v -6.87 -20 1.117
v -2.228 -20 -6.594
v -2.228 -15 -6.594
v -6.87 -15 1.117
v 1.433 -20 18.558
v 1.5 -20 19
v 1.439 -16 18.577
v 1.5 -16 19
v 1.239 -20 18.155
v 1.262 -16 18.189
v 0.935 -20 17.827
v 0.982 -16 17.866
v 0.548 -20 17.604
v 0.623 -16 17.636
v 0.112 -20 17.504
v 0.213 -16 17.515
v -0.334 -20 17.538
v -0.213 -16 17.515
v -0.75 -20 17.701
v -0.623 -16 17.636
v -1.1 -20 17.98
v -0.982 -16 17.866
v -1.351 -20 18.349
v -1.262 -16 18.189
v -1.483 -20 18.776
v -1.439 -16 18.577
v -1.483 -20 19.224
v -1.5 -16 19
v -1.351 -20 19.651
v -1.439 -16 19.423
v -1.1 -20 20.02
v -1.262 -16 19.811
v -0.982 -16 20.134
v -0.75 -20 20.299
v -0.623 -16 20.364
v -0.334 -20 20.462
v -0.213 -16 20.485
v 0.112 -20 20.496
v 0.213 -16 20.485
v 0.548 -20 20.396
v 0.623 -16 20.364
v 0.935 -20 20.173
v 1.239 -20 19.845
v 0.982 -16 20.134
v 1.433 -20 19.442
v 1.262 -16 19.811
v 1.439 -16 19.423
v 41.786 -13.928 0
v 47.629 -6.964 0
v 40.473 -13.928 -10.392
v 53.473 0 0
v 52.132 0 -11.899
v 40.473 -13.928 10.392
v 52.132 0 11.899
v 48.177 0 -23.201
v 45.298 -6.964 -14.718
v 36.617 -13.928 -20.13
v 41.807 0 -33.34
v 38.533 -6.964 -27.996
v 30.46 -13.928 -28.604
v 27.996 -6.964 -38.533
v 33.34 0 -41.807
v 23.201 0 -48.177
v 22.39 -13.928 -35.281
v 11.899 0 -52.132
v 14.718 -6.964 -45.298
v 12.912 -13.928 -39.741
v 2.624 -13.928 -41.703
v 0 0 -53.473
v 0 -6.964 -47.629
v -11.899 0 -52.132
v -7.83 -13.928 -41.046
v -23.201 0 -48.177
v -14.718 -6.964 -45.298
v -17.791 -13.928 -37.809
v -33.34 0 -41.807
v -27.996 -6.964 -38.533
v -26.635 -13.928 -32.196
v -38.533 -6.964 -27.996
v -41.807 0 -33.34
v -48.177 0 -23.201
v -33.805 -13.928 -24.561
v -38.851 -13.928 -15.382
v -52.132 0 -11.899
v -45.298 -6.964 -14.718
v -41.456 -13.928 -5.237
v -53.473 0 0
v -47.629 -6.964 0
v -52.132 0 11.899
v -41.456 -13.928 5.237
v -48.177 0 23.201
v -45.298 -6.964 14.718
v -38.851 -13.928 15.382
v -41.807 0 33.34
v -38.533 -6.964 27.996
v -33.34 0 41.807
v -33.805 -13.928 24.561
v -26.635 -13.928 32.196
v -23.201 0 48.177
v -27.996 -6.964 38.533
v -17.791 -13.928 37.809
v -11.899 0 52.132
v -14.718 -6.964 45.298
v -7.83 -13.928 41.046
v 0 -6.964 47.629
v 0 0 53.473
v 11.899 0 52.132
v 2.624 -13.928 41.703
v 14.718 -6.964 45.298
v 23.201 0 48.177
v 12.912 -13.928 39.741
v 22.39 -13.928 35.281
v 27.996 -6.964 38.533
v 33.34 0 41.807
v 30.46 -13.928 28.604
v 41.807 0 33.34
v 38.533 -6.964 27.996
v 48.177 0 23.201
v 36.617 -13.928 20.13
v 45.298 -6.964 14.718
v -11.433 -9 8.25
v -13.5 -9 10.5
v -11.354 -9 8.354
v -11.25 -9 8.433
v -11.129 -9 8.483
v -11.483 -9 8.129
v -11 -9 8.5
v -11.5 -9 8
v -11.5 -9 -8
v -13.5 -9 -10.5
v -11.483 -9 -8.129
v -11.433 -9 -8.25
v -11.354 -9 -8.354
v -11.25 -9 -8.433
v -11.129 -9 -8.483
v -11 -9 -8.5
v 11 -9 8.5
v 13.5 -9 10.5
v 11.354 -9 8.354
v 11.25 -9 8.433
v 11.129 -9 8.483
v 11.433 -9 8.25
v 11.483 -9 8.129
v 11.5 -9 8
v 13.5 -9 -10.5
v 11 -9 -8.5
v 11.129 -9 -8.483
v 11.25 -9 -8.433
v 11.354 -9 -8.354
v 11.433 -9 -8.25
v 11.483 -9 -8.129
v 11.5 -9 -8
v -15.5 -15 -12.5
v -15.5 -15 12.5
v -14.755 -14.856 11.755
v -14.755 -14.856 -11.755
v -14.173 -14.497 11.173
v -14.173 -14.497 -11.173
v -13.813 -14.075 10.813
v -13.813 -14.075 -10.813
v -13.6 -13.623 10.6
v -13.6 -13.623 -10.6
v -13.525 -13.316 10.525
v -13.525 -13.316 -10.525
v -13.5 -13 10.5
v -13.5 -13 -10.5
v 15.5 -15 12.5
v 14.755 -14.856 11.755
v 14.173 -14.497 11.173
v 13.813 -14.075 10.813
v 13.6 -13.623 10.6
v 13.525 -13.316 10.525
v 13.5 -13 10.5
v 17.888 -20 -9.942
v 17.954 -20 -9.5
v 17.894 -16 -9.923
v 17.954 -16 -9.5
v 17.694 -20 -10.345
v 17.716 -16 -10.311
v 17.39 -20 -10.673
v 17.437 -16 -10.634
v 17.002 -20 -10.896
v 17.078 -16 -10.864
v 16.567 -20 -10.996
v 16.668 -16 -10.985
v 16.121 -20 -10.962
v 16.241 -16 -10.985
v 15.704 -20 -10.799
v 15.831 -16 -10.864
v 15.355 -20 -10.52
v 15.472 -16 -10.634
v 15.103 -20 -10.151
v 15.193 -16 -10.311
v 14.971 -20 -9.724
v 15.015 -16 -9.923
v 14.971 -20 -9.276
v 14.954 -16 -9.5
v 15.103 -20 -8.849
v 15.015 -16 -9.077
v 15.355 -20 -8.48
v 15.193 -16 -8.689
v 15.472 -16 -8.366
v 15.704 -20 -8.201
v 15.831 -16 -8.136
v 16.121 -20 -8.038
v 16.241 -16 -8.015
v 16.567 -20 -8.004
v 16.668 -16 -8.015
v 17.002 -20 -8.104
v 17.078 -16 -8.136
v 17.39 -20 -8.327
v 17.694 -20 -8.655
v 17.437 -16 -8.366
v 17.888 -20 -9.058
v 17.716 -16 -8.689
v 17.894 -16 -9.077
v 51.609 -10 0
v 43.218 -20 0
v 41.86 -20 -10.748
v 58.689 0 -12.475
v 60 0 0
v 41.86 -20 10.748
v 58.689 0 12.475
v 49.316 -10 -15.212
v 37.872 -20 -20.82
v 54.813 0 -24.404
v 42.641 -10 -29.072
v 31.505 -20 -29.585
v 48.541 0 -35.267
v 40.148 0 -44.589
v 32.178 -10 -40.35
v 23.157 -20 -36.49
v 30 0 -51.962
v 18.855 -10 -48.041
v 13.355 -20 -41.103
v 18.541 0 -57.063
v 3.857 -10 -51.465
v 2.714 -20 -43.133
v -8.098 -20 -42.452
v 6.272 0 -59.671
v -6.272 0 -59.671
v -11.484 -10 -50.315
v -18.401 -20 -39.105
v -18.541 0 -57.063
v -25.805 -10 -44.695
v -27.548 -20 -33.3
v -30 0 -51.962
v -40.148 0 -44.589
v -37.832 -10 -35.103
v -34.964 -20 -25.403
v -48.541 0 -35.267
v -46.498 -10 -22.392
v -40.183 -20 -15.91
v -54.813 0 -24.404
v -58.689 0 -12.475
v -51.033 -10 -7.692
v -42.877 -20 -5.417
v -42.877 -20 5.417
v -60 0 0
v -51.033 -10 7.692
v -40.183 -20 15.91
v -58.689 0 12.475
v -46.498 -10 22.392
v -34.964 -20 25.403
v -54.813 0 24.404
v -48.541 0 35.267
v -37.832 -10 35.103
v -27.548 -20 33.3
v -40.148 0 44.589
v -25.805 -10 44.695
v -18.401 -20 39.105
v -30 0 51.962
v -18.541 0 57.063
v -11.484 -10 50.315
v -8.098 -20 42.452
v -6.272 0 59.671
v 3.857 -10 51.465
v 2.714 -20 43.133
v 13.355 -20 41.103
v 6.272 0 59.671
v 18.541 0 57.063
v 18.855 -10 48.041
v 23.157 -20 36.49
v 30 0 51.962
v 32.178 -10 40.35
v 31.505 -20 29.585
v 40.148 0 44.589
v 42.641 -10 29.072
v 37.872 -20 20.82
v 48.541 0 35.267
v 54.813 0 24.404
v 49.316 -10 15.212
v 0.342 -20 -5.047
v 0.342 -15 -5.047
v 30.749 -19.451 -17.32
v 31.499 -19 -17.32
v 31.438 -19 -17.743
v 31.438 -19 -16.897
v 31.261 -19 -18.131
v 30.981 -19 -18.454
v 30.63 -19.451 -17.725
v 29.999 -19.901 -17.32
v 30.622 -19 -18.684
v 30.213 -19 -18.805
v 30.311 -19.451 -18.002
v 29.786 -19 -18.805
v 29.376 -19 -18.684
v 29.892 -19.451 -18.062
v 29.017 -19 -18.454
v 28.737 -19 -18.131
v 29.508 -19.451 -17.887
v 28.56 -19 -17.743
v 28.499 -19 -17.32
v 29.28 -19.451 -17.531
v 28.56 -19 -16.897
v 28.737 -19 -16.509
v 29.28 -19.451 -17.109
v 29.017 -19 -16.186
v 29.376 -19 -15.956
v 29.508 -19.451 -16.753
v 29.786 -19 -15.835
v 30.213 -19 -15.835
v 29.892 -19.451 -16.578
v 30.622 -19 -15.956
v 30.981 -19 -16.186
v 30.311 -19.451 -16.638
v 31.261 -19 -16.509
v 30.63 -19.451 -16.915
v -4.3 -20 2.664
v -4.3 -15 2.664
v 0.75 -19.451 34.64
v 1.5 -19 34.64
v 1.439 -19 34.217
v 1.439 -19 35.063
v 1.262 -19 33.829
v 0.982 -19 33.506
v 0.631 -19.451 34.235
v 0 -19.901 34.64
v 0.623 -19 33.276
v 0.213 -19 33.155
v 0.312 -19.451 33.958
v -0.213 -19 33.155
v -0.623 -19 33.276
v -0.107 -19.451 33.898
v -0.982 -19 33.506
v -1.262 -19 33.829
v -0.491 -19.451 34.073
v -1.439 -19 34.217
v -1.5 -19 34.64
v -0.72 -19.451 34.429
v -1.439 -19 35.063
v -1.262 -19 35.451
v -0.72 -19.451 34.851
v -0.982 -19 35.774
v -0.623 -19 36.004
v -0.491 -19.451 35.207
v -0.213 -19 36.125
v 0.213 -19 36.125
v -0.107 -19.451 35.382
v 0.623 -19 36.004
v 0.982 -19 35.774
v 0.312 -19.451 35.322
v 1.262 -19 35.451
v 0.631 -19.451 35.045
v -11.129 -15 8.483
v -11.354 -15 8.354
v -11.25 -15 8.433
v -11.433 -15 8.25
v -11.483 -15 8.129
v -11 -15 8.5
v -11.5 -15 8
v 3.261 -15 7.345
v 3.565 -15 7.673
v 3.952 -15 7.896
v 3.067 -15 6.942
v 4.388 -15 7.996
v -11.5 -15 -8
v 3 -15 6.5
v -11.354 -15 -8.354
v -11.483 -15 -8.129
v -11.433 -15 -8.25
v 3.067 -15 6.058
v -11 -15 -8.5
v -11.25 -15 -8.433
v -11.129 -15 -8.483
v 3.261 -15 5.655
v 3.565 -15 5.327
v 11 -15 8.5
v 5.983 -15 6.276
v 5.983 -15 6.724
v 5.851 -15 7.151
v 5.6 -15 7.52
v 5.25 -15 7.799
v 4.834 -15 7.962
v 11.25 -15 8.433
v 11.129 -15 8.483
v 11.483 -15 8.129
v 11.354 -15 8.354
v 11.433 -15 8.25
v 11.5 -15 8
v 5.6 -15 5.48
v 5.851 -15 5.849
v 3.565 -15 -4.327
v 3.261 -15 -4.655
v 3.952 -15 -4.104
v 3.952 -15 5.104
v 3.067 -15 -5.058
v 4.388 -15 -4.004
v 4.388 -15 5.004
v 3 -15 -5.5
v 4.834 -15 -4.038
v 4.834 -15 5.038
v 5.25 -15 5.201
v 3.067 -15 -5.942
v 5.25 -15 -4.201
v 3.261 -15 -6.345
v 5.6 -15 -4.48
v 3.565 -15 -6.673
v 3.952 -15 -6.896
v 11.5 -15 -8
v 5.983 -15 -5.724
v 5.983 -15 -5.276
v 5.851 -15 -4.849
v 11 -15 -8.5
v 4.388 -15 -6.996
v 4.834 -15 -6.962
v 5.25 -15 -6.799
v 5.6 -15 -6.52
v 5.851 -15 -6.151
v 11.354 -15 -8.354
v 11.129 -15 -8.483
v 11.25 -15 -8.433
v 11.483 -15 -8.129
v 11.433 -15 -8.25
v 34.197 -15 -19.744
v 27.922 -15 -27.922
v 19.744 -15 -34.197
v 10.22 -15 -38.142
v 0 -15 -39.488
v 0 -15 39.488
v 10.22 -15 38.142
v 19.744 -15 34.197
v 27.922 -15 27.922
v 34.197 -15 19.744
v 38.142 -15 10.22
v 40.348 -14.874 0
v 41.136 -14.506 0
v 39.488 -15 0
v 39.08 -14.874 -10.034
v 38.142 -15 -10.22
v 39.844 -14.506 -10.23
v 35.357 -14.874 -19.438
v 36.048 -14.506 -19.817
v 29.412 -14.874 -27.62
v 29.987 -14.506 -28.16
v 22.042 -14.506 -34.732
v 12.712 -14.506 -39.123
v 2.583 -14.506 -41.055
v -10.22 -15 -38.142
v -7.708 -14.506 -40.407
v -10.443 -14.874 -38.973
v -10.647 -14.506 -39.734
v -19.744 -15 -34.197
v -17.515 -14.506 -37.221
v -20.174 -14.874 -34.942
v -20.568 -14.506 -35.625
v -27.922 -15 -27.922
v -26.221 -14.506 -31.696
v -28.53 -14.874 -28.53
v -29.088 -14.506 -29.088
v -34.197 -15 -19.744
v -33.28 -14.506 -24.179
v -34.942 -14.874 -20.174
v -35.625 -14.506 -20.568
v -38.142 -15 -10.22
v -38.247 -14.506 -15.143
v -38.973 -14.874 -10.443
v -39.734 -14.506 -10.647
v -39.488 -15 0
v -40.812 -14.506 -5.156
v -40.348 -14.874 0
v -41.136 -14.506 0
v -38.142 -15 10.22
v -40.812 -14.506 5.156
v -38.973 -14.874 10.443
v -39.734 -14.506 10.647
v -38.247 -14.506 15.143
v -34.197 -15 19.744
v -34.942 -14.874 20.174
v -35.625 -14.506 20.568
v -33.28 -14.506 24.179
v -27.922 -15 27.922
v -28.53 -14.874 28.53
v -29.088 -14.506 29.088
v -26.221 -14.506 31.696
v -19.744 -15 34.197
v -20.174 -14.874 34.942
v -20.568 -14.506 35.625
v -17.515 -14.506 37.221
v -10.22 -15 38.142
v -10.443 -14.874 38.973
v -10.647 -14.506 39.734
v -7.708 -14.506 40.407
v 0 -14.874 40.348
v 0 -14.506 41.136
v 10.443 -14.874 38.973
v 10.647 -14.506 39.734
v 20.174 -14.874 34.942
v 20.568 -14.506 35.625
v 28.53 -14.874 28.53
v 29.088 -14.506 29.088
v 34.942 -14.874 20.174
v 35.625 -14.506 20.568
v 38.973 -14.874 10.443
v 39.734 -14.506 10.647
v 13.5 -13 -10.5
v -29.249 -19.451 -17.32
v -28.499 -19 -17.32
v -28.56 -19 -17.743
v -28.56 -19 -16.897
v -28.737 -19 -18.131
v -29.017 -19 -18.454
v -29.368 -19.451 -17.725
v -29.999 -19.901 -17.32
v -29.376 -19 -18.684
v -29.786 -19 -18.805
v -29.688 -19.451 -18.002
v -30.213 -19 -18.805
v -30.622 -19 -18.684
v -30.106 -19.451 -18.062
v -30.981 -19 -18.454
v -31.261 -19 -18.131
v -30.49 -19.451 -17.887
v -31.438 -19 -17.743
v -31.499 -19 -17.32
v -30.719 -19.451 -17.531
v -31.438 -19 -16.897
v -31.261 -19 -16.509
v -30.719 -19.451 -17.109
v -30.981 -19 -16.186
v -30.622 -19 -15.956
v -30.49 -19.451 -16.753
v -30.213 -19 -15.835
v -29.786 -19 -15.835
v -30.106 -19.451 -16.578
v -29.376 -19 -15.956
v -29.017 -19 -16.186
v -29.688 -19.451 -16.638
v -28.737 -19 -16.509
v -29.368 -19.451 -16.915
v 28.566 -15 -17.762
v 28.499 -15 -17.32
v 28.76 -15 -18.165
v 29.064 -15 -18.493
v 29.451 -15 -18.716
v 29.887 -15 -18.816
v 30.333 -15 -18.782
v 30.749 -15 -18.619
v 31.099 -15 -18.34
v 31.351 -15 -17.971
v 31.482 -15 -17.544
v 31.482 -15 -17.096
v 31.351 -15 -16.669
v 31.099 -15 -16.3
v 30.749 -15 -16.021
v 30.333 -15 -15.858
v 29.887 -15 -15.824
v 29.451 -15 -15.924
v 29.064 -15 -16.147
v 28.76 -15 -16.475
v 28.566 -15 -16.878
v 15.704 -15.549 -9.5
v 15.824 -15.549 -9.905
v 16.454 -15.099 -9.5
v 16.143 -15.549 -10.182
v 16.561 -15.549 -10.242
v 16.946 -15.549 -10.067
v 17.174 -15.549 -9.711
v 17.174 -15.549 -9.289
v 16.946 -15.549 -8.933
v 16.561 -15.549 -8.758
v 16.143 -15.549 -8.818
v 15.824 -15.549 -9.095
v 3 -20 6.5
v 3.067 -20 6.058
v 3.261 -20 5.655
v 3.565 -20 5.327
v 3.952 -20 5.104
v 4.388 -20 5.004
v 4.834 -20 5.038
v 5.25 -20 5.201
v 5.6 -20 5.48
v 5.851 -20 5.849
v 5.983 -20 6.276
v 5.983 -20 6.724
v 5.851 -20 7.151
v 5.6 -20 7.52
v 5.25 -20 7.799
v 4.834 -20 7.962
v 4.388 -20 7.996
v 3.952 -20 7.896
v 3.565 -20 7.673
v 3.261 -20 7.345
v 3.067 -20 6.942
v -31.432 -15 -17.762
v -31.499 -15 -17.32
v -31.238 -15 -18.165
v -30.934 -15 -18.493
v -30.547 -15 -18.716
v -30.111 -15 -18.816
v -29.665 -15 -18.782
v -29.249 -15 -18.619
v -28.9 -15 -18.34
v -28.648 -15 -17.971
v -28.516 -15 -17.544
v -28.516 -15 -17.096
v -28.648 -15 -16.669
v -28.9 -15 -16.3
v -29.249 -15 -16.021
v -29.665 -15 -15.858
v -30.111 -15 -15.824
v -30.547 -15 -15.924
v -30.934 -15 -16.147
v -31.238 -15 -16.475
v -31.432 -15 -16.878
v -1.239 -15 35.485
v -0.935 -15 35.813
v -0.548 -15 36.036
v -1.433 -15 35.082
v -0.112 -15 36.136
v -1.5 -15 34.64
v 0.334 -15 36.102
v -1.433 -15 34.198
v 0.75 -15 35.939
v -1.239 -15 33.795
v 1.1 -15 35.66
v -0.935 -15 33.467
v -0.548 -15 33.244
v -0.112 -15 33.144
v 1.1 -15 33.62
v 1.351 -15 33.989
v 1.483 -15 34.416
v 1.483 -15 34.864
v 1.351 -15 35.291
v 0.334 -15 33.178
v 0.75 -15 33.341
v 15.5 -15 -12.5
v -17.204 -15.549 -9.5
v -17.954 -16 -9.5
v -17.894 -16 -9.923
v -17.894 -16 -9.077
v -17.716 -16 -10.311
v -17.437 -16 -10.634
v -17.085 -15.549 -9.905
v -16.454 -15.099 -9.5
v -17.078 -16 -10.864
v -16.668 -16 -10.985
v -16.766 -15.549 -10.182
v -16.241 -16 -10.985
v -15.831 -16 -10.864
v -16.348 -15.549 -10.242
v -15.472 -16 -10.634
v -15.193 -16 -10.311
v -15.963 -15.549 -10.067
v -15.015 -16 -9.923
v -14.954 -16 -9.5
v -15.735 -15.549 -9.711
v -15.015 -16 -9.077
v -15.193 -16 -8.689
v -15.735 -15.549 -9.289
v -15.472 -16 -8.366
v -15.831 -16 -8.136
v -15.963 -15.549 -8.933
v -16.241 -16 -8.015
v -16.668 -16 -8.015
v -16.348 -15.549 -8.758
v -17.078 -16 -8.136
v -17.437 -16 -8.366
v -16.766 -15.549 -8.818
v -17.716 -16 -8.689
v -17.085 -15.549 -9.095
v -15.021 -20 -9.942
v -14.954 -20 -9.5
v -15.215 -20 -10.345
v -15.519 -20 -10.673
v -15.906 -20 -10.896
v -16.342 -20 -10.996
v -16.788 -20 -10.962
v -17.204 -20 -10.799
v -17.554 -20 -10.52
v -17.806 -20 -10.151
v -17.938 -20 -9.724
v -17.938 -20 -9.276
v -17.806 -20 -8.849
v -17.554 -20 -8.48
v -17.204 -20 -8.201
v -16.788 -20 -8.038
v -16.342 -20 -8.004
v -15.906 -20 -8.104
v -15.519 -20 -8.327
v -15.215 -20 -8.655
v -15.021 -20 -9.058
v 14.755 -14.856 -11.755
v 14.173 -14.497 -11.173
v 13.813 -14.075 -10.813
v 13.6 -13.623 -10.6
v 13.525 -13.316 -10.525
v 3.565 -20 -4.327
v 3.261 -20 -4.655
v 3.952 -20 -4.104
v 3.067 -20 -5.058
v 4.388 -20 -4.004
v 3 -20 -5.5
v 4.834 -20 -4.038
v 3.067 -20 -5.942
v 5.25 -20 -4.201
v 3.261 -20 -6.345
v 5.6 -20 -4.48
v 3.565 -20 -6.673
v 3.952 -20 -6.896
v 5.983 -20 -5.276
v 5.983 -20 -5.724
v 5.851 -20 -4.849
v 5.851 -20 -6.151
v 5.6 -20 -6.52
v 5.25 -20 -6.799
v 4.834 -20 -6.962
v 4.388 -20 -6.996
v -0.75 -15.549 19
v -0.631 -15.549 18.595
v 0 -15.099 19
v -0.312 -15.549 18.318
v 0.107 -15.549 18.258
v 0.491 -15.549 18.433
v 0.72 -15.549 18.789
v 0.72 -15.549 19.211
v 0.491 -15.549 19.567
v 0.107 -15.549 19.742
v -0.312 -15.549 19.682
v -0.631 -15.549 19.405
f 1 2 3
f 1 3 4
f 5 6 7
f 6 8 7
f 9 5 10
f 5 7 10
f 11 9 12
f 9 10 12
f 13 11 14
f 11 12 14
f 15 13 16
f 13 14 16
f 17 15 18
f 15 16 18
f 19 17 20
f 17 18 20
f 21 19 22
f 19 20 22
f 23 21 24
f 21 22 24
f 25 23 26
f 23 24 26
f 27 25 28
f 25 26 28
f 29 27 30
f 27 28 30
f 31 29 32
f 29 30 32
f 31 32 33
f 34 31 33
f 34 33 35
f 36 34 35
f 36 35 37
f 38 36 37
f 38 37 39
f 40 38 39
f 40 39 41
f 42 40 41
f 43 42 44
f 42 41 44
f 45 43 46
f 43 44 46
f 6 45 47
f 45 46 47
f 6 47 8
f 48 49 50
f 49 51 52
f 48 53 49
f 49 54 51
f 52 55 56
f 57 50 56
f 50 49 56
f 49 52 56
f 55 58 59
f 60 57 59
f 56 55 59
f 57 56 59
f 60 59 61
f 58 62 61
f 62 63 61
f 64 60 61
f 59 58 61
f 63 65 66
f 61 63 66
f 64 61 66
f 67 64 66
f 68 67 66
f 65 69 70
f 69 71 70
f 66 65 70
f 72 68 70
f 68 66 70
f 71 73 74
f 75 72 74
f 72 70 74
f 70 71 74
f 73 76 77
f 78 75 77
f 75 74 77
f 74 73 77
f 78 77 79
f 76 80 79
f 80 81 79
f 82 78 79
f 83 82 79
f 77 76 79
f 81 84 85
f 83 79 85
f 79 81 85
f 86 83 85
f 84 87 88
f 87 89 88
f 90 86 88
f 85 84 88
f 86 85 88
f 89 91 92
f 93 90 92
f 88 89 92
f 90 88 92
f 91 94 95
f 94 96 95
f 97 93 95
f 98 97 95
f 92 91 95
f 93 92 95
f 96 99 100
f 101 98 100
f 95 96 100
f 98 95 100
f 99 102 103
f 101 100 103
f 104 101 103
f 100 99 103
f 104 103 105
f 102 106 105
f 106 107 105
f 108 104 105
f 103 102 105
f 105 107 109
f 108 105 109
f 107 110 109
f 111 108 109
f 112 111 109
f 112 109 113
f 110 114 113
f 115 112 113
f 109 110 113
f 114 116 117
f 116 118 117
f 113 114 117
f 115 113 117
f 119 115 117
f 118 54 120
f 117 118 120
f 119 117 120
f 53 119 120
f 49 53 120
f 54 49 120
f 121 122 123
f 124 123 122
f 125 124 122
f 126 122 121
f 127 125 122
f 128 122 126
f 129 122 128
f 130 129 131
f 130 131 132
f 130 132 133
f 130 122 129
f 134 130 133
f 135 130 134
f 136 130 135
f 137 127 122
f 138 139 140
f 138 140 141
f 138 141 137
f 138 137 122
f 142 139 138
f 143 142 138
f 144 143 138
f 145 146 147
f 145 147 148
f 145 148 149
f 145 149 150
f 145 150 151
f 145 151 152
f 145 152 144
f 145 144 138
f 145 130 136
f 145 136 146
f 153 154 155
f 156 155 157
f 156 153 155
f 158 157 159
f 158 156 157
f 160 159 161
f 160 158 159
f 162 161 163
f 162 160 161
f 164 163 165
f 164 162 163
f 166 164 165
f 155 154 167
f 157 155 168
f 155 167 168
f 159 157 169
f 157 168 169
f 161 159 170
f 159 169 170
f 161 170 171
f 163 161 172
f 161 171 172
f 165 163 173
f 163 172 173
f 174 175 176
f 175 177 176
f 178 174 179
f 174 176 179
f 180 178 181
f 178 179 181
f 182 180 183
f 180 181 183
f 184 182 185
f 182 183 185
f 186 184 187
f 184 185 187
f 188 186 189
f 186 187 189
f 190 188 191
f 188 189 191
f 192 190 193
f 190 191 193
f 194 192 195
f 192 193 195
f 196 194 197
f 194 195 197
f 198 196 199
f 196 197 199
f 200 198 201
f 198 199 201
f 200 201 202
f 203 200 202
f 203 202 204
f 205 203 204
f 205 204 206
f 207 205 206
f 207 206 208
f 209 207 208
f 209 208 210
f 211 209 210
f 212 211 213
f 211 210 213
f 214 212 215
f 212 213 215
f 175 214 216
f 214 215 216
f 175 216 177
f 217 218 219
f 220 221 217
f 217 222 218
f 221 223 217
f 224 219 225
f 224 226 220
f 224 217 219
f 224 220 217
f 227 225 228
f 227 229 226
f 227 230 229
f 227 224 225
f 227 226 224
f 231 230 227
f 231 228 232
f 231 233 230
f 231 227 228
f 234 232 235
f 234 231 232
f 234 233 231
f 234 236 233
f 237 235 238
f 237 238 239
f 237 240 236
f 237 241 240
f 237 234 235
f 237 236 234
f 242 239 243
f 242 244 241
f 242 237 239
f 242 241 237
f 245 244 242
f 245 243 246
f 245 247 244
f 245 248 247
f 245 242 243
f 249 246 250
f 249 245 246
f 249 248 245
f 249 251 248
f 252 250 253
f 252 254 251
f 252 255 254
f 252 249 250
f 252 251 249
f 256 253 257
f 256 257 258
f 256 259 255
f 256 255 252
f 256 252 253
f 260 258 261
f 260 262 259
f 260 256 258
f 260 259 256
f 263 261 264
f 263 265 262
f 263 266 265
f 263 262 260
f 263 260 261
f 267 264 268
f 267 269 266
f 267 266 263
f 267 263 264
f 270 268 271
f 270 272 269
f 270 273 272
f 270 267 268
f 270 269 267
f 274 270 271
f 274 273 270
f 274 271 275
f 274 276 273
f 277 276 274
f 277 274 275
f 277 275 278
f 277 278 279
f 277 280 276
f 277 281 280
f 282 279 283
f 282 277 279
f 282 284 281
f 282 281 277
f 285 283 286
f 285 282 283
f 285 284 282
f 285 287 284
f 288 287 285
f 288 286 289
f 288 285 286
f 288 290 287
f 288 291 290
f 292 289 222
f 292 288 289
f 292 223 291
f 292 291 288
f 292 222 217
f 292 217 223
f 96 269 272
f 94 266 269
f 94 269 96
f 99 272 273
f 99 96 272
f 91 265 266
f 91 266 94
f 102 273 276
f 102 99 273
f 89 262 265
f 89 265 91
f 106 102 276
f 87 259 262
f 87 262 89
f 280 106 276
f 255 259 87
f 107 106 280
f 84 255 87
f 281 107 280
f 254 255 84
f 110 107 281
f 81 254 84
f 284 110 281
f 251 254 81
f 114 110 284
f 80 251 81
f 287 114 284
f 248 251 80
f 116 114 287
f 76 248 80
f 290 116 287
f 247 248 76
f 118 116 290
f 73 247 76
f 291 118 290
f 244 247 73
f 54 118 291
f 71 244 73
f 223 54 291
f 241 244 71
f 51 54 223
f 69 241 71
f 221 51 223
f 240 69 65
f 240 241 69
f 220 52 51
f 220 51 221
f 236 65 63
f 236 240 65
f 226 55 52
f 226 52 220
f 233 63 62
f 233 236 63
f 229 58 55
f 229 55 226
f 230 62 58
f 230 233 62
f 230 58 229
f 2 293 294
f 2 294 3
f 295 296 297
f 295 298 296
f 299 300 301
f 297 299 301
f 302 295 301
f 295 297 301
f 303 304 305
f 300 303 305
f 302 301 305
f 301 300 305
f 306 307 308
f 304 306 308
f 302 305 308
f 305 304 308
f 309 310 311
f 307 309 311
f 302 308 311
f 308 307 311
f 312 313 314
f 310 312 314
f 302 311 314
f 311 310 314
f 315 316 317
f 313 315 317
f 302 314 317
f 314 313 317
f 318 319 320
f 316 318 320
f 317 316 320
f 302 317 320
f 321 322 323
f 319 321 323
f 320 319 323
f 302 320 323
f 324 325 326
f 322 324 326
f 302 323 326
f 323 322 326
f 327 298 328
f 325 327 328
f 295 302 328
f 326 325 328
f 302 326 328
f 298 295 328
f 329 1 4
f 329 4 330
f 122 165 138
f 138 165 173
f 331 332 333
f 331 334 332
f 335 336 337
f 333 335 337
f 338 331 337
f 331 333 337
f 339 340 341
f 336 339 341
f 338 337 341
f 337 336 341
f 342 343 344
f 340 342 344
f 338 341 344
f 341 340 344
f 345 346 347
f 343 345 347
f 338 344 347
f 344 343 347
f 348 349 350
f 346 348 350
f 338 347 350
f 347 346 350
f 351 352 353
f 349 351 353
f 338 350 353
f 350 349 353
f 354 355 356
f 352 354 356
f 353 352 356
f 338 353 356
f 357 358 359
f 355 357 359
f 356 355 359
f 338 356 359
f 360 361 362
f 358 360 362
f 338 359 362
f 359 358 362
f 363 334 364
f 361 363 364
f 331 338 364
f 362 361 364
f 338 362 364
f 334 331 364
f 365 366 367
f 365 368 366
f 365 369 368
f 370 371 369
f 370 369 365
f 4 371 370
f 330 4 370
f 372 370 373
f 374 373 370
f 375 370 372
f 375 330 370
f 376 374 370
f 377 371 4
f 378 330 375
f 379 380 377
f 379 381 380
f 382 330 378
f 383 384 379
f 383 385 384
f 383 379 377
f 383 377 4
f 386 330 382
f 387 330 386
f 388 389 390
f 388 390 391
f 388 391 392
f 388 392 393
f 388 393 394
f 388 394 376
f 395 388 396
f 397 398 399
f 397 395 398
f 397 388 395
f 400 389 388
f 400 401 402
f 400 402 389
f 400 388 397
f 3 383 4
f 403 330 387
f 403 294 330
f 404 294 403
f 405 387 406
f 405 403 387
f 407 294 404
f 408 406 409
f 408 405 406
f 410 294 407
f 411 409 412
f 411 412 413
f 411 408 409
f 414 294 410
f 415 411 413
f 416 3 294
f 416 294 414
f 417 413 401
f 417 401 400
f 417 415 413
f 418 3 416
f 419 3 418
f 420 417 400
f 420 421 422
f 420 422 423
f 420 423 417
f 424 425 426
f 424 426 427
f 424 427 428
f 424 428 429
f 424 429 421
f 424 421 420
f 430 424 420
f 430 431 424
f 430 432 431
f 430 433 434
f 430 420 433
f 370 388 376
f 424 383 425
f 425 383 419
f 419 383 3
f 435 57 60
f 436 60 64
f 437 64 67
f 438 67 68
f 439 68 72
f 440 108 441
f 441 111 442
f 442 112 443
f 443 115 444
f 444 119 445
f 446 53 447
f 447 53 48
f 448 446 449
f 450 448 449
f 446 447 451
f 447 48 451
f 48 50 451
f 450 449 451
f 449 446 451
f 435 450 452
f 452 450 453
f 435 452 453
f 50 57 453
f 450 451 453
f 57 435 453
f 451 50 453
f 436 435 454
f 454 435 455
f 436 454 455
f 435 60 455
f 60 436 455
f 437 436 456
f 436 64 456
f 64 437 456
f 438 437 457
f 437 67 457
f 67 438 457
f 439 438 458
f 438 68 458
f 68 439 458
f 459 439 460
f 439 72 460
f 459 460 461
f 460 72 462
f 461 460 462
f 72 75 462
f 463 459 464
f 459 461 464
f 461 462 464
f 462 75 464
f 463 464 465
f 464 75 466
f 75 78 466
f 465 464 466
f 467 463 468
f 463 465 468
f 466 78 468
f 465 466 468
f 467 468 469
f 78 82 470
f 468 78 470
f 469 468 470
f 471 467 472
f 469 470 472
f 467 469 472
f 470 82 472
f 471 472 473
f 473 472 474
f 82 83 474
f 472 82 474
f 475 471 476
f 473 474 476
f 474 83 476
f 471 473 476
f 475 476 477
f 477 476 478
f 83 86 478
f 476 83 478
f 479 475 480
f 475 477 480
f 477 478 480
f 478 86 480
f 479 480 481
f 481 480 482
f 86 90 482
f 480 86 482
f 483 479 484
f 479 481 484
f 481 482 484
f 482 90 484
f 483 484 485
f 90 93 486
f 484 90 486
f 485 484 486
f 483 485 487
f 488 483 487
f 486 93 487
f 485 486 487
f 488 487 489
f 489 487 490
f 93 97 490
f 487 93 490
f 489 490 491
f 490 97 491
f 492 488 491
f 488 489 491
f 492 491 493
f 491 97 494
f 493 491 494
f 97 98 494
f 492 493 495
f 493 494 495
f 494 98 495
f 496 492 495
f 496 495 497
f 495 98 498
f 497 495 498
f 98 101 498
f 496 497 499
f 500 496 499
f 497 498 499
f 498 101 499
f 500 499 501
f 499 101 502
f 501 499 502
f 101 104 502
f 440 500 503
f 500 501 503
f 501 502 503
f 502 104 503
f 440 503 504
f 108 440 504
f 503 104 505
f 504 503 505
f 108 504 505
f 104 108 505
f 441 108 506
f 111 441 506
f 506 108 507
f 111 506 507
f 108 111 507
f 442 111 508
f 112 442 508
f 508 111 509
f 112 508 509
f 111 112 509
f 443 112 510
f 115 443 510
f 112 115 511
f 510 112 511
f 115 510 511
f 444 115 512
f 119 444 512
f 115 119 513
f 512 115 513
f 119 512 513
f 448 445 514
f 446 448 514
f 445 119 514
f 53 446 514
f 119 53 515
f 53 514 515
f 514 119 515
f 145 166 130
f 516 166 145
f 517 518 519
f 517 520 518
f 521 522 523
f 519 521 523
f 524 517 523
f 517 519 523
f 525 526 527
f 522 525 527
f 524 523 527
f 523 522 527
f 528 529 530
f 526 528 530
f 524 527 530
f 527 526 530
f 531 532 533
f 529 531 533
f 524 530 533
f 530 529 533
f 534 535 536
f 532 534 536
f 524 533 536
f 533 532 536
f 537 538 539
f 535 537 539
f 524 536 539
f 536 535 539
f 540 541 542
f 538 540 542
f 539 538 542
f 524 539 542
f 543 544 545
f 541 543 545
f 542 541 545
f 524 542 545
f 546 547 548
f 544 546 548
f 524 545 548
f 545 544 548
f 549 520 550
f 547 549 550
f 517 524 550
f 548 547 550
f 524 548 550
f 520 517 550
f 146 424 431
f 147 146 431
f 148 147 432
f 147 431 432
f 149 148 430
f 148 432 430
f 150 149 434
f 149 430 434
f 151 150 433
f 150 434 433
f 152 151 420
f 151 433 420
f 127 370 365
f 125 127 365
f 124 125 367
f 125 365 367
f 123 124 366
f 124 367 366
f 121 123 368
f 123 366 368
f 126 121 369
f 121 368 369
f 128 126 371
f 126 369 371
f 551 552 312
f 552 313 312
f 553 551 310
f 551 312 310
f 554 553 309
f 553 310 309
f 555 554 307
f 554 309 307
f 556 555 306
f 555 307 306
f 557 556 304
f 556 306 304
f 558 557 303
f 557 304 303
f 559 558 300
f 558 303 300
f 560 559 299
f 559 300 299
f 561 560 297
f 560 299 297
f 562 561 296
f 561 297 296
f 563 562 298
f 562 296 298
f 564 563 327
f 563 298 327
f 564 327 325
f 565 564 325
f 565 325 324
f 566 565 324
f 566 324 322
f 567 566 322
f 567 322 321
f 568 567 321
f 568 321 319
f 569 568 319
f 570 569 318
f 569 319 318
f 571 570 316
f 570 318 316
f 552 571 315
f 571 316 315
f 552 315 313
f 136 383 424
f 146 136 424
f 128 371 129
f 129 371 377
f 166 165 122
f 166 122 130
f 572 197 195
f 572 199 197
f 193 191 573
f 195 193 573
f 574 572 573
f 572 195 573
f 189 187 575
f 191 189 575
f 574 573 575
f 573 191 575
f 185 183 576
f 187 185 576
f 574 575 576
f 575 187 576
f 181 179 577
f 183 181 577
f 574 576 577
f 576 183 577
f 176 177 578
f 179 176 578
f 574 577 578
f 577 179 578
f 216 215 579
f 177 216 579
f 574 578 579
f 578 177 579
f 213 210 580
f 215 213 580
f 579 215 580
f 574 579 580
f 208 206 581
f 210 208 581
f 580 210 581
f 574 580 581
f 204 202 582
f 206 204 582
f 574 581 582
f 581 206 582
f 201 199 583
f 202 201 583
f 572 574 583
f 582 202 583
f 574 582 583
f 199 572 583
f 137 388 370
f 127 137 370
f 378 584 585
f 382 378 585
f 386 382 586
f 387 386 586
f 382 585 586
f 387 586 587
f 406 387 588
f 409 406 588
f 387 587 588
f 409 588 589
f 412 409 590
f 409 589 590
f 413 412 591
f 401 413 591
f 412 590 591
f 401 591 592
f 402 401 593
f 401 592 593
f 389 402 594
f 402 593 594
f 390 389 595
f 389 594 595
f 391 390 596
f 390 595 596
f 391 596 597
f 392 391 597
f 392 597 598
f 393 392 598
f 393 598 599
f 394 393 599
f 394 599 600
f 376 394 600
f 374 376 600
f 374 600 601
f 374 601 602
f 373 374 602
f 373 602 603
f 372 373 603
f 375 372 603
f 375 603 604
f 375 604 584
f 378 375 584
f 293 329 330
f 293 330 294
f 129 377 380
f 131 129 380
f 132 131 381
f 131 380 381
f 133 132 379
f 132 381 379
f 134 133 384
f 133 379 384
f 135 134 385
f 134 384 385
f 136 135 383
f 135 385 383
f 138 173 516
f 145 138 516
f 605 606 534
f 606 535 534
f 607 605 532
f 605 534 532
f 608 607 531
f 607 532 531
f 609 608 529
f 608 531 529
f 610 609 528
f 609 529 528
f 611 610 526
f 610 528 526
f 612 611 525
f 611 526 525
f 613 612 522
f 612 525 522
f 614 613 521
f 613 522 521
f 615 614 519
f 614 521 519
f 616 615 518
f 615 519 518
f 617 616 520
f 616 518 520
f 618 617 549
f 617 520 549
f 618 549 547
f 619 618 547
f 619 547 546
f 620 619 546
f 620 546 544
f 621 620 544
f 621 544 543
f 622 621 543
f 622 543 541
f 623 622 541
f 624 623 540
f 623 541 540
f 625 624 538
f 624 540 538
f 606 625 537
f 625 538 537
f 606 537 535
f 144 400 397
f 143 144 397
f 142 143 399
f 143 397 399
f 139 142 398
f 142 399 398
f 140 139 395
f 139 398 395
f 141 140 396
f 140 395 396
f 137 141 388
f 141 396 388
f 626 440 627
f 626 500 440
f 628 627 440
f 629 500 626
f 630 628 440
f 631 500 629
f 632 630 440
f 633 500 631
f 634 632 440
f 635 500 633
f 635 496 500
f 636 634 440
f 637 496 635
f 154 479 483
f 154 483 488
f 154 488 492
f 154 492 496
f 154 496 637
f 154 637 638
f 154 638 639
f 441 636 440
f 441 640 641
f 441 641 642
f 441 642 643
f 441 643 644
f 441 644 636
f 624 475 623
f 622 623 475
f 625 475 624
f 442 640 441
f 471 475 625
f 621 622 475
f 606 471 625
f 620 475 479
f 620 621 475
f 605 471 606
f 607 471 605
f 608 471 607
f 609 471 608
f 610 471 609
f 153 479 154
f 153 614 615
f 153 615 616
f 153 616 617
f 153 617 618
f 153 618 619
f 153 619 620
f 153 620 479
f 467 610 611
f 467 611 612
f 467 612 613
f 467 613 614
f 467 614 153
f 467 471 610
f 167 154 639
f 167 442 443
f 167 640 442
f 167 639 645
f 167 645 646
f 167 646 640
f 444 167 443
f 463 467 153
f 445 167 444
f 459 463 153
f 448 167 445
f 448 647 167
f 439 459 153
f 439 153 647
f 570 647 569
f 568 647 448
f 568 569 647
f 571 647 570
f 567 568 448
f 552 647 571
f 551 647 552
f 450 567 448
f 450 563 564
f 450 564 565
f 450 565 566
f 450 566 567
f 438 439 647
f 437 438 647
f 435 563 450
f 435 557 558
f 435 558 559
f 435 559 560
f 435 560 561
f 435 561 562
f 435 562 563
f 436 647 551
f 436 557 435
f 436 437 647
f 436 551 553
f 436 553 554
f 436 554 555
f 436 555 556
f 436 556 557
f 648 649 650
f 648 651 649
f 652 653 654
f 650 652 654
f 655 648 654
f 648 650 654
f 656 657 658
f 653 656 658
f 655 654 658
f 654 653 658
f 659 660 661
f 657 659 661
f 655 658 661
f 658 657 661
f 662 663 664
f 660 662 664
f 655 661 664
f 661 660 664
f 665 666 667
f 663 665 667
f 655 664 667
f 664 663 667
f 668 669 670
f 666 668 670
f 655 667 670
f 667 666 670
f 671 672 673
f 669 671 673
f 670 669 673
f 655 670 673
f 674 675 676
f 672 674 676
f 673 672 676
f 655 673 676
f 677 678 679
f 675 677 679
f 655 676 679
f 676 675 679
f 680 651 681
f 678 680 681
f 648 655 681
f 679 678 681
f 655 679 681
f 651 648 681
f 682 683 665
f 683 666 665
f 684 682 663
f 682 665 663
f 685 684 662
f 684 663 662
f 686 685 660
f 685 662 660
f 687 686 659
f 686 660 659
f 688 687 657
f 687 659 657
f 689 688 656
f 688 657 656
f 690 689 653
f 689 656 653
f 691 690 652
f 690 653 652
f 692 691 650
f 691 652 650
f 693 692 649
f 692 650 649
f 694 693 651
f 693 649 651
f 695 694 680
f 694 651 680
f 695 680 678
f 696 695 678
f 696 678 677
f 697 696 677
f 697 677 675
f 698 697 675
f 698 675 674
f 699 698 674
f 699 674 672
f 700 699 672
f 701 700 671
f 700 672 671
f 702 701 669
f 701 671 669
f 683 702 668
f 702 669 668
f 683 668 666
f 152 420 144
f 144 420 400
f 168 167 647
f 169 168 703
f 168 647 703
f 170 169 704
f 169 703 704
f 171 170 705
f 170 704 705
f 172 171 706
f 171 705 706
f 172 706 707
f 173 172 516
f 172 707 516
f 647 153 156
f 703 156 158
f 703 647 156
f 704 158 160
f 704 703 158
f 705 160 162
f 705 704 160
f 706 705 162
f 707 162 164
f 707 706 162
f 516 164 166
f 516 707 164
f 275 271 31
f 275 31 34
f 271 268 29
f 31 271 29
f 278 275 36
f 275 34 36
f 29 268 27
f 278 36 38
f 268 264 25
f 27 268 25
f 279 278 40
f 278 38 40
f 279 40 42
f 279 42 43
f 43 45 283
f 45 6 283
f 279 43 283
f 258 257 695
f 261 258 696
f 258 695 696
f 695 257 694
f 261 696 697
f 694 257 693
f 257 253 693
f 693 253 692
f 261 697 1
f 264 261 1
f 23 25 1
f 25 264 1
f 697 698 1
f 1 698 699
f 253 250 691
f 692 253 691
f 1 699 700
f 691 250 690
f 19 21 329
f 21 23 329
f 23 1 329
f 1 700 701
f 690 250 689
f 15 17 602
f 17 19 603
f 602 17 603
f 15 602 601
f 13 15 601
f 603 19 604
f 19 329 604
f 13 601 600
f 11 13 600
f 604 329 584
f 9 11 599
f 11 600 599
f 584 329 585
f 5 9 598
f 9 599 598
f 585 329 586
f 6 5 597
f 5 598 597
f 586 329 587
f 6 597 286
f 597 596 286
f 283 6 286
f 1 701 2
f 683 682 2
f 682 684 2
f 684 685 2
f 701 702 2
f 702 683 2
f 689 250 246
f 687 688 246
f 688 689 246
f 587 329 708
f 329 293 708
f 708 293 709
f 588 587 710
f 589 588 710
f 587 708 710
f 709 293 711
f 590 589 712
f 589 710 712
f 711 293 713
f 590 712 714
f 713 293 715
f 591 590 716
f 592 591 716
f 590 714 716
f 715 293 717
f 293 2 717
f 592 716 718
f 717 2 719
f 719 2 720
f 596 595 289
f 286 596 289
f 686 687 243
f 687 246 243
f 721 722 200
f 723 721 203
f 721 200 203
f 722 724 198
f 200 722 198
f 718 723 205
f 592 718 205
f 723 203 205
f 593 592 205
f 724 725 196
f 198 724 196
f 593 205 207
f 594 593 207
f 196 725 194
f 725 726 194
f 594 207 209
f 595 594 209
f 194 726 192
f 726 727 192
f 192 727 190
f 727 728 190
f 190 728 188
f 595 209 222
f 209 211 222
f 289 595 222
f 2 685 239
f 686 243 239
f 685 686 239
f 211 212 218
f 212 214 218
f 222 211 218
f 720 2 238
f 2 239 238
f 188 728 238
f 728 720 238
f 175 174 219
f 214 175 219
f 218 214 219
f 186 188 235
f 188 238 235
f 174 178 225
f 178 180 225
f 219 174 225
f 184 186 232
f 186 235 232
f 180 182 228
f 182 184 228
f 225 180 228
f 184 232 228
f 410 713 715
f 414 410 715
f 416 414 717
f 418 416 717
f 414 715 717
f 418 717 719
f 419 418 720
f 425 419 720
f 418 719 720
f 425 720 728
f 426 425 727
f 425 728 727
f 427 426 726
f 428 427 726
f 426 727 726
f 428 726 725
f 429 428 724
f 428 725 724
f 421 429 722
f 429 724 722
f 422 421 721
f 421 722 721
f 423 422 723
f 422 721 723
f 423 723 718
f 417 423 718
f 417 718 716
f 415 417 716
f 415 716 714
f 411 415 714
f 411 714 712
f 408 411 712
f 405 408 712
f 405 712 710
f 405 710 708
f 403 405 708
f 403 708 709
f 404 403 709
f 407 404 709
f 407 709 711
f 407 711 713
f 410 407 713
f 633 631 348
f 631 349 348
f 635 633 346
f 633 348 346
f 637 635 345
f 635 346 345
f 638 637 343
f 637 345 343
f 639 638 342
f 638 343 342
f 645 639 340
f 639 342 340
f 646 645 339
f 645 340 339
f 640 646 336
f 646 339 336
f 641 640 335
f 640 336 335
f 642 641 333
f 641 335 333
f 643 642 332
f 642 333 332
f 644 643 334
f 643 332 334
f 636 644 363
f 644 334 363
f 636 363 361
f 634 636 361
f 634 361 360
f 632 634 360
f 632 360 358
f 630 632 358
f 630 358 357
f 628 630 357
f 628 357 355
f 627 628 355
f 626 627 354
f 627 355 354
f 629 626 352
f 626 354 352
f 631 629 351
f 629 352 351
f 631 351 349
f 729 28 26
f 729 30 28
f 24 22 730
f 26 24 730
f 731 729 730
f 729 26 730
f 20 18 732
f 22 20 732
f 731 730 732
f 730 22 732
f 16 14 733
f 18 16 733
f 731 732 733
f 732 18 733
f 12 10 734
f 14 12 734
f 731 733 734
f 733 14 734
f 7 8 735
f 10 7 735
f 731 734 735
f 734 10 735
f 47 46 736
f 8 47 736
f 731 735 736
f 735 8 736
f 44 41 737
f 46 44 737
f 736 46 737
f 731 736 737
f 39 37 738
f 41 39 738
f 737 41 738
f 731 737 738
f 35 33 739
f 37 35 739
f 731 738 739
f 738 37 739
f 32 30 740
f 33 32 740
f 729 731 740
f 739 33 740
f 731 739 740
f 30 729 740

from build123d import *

# Parameters (mm, degrees)
SKETCH1_R                 = 60
BOSS_EXTRUDE1_DEPTH       = 20
BOSS_EXTRUDE1_DRAFT       = -40
SHELL1_T                  = -5
SKETCH3_W                 = 27
SKETCH3_H                 = 21
BOSS_EXTRUDE2_DEPTH       = 6
F_3_0MM_DOWEL_HOLE1_D     = 3
F_3_0MM_DOWEL_HOLE1_DEPTH = 4
F_3_0MM_DOWEL_HOLE1_TIP   = 0.901290929
F_3_0MM_DOWEL_HOLE2_D     = 3
F_3_0MM_DOWEL_HOLE2_DEPTH = 10
F_3_0MM_DOWEL_HOLE2_TIP   = 0.901290929
FILLET2_R                 = 2
F_3_0MM_DOWEL_HOLE3_D     = 3
F_3_0MM_DOWEL_HOLE3_DEPTH = 4
F_3_0MM_DOWEL_HOLE3_TIP   = 0.901290929
CUT_EXTRUDE1_DEPTH        = 10
FILLET3_R                 = 3


with BuildPart() as part:
    # Sketch1 → Boss-Extrude1 (with draft: the straight prism first)
    with BuildSketch(Plane(origin=(0, 0, 0), x_dir=(1, 0, 0), z_dir=(0, 1, 0))):
        Circle(SKETCH1_R)
    extrude(amount=-BOSS_EXTRUDE1_DEPTH)
    # Boss-Extrude1: the draft: its side faces are tilted about the plane it starts from
    boss_extrude1_sides = [part.faces().sort_by_distance(p)[0] for p in [
        (-60, -10, 0),
    ]]
    draft(boss_extrude1_sides, Plane(origin=(0, 0, 0), x_dir=(1, 0, 0), z_dir=(0, 1, 0)), BOSS_EXTRUDE1_DRAFT)

    # Shell1
    shell1_openings = [part.faces().sort_by_distance(p)[0] for p in [
        (0, 0, 0),
    ]]
    offset(amount=SHELL1_T, openings=shell1_openings, kind=Kind.INTERSECTION)

    # Sketch3 → Boss-Extrude2 (add)
    with BuildSketch(Plane(origin=(0, -15, 0), x_dir=(1, 0, 0), z_dir=(0, 1, 0))):
        Rectangle(SKETCH3_W, SKETCH3_H)
        with BuildLine():
            Line((-11, 8.5), (11, 8.5))
            ThreePointArc((11, 8.5), (11.353553391, 8.353553391), (11.5, 8))
            Line((11.5, 8), (11.5, -8))
            ThreePointArc((11.5, -8), (11.353553391, -8.353553391), (11, -8.5))
            Line((11, -8.5), (-11, -8.5))
            ThreePointArc((-11, -8.5), (-11.353553391, -8.353553391), (-11.5, -8))
            Line((-11.5, -8), (-11.5, 8))
            ThreePointArc((-11.5, 8), (-11.353553391, 8.353553391), (-11, 8.5))
        make_face(mode=Mode.SUBTRACT)
    extrude(amount=BOSS_EXTRUDE2_DEPTH)

    # Ø3.0mm Dowel Hole1
    with Locations(Plane(origin=(0, -15, 0), x_dir=(1, 0, 0), z_dir=(0, 1, 0))):
        with Locations((-29.999119987, 17.32), (29.999119987, 17.32), (0, -34.64)):
            Hole(F_3_0MM_DOWEL_HOLE1_D / 2, depth=F_3_0MM_DOWEL_HOLE1_DEPTH)
            with Locations((0, 0, -(F_3_0MM_DOWEL_HOLE1_DEPTH + F_3_0MM_DOWEL_HOLE1_TIP / 2))):  # 118° drill point
                Cone(0, F_3_0MM_DOWEL_HOLE1_D / 2, F_3_0MM_DOWEL_HOLE1_TIP, mode=Mode.SUBTRACT)

    # Ø3.0mm Dowel Hole2
    with Locations(Plane(origin=(0, -15, 0), x_dir=(1, 0, 0), z_dir=(0, 1, 0))):
        with Locations((4.5, 5.5), (4.5, -6.5)):
            Hole(F_3_0MM_DOWEL_HOLE2_D / 2, depth=F_3_0MM_DOWEL_HOLE2_DEPTH)
            with Locations((0, 0, -(F_3_0MM_DOWEL_HOLE2_DEPTH + F_3_0MM_DOWEL_HOLE2_TIP / 2))):  # 118° drill point
                Cone(0, F_3_0MM_DOWEL_HOLE2_D / 2, F_3_0MM_DOWEL_HOLE2_TIP, mode=Mode.SUBTRACT)

    # Fillet2
    fillet2_edges = [part.edges().sort_by_distance(p)[0] for p in [
        (-13.5, -15, 0),
        (0, -15, 10.5),
        (13.5, -15, 0),
        (0, -15, -10.5),
    ]]
    fillet(fillet2_edges, radius=FILLET2_R)

    # Ø3.0mm Dowel Hole3
    with Locations(Plane(origin=(0, -20, 0), x_dir=(-1, 0, 0), z_dir=(0, -1, 0))):
        with Locations((0, -19), (-16.454482672, 9.5), (16.454482672, 9.5)):
            Hole(F_3_0MM_DOWEL_HOLE3_D / 2, depth=F_3_0MM_DOWEL_HOLE3_DEPTH)
            with Locations((0, 0, -(F_3_0MM_DOWEL_HOLE3_DEPTH + F_3_0MM_DOWEL_HOLE3_TIP / 2))):  # 118° drill point
                Cone(0, F_3_0MM_DOWEL_HOLE3_D / 2, F_3_0MM_DOWEL_HOLE3_TIP, mode=Mode.SUBTRACT)

    # Sketch11 → Cut-Extrude1 (cut)
    with BuildSketch(Plane.XZ.offset(20)):
        Polygon((0.341916748, -5.046701194), (-2.228267182, -6.594006776), (-6.87018393, 1.116545014), (-4.3, 2.663850596), align=None)
    extrude(amount=-CUT_EXTRUDE1_DEPTH, mode=Mode.SUBTRACT)

    # Fillet3
    fillet3_edges = [part.edges().sort_by_distance(p)[0] for p in [
        (-40.886469086, -15, 0),
    ]]
    fillet(fillet3_edges, radius=FILLET3_R)


solid = part.part
